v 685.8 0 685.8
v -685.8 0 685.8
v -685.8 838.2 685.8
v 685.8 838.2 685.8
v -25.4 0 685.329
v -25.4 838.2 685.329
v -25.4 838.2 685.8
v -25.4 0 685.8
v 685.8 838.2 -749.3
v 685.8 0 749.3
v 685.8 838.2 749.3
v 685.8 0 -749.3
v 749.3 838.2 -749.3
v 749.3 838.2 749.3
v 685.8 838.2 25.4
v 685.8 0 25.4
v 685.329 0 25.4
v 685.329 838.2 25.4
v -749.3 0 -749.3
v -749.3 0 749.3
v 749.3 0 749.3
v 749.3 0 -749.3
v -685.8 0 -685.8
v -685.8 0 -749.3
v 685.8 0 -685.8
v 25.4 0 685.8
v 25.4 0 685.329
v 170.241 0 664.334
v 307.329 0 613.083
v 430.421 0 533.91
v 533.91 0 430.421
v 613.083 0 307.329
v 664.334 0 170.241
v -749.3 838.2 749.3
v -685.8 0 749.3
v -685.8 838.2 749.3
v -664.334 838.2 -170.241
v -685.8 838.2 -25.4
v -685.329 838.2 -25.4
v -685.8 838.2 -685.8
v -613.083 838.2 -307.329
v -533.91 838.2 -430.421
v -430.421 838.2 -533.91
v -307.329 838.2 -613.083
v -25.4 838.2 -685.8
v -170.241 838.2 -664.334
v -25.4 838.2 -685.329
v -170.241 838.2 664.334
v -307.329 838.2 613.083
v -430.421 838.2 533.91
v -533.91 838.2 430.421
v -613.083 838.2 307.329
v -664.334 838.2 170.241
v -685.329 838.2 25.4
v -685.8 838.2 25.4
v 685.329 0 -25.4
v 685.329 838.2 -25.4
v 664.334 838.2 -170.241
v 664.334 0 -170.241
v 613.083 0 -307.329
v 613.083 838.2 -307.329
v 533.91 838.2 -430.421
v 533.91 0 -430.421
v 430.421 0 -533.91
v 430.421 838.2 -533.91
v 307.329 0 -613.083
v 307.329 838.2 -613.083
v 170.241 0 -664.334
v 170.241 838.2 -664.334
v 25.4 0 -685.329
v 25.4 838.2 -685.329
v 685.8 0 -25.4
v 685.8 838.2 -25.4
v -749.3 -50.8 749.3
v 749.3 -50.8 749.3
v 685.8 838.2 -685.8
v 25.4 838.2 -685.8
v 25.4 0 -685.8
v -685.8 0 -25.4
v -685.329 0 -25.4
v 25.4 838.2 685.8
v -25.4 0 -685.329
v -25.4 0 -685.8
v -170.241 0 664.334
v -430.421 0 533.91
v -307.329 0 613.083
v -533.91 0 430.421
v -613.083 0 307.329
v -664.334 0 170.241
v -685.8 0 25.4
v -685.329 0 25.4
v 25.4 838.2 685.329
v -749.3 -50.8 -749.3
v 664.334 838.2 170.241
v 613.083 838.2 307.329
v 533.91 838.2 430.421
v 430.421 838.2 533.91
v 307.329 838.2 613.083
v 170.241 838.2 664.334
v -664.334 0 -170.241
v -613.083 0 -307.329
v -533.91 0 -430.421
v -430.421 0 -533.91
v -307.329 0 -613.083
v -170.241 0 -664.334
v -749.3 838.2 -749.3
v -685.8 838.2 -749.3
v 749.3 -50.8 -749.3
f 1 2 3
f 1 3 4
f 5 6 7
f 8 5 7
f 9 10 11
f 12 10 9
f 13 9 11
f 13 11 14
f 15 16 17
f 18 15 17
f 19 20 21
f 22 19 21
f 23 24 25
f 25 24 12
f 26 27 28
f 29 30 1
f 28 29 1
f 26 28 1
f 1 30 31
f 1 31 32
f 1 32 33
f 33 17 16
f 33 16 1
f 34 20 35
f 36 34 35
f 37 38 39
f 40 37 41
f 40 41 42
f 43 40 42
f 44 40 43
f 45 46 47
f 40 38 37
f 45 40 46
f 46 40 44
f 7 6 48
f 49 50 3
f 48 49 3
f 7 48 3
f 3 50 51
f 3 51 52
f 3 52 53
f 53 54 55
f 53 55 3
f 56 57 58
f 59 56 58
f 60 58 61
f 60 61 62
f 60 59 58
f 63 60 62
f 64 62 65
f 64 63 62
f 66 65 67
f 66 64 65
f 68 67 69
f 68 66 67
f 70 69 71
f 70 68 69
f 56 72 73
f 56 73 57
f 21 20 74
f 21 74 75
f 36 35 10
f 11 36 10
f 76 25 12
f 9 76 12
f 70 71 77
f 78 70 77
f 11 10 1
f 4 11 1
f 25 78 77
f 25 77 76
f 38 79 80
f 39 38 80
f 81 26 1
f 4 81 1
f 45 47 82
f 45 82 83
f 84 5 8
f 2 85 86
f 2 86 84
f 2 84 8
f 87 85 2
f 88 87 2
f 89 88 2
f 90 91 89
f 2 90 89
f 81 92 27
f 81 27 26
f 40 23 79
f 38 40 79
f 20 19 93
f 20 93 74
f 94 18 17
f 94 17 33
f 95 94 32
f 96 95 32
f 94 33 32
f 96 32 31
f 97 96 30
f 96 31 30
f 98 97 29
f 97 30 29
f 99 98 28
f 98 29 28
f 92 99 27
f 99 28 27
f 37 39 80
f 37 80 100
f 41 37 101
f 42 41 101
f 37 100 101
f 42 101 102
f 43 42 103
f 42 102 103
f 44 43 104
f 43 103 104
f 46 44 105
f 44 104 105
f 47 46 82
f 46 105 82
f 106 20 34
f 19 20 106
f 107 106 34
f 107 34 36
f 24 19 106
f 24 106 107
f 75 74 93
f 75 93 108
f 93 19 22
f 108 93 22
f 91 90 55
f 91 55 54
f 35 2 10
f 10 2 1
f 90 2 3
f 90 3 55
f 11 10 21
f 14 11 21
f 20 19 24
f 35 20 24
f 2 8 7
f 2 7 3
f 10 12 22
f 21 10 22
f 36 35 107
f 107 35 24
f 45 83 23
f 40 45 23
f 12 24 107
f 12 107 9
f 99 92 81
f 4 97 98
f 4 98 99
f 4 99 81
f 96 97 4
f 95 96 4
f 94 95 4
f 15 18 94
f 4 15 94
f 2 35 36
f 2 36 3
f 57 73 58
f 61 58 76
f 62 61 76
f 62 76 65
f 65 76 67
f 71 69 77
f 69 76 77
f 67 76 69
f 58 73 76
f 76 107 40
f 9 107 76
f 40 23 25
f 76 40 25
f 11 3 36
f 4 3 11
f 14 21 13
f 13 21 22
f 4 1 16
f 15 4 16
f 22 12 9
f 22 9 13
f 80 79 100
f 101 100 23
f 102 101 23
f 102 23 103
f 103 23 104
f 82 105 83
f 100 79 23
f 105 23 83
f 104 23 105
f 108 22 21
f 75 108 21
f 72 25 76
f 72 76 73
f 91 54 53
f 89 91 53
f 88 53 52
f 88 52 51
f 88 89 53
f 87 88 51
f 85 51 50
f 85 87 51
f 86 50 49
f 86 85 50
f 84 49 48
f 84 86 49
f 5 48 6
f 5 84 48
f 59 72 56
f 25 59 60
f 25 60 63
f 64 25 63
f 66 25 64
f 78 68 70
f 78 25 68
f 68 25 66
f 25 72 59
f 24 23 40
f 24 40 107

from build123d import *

# Parameters (mm, degrees)
SKETCH1_W             = 1371.6
SKETCH1_H             = 63.5
BOSS_EXTRUDE1_DEPTH   = 838.2
BOSS_EXTRUDE1_2_DEPTH = 838.2
SKETCH2_W             = 63.5
SKETCH2_H             = 1498.6
BOSS_EXTRUDE2_DEPTH   = 838.2
BOSS_EXTRUDE2_2_DEPTH = 838.2
SKETCH3_W             = 1498.6
SKETCH3_H             = 1498.6
BOSS_EXTRUDE3_DEPTH   = 50.8
BOSS_EXTRUDE4_DEPTH   = 838.2
BOSS_EXTRUDE4_2_DEPTH = 838.2
BOSS_EXTRUDE4_3_DEPTH = 838.2
BOSS_EXTRUDE4_4_DEPTH = 838.2


with BuildPart() as part:
    # Sketch1 → Boss-Extrude1 (new body)
    with BuildSketch(Plane(origin=(0, 0, 0), x_dir=(1, 0, 0), z_dir=(0, 1, 0))):
        with Locations((0, 717.55)):
            Rectangle(SKETCH1_W, SKETCH1_H)
    extrude(amount=BOSS_EXTRUDE1_DEPTH)


with BuildPart() as body_2:
    # Sketch1 → Boss-Extrude1 2 (new body)
    with BuildSketch(Plane(origin=(0, 0, 0), x_dir=(1, 0, 0), z_dir=(0, 1, 0))):
        with Locations((0, -717.55)):
            Rectangle(SKETCH1_W, SKETCH1_H)
    extrude(amount=BOSS_EXTRUDE1_2_DEPTH)


with BuildPart() as body_3:
    # Sketch2 → Boss-Extrude2 (new body)
    with BuildSketch(Plane(origin=(0, 0, 0), x_dir=(1, 0, 0), z_dir=(0, 1, 0))):
        with Locations((717.55, 0)):
            Rectangle(SKETCH2_W, SKETCH2_H)
    extrude(amount=BOSS_EXTRUDE2_DEPTH)


with BuildPart() as body_4:
    # Sketch2 → Boss-Extrude2 2 (new body)
    with BuildSketch(Plane(origin=(0, 0, 0), x_dir=(1, 0, 0), z_dir=(0, 1, 0))):
        with Locations((-717.55, 0)):
            Rectangle(SKETCH2_W, SKETCH2_H)
    extrude(amount=BOSS_EXTRUDE2_2_DEPTH)


with BuildPart() as body_5:
    # Sketch3 → Boss-Extrude3 (new body)
    with BuildSketch(Plane.XZ):
        Rectangle(SKETCH3_W, SKETCH3_H)
    extrude(amount=BOSS_EXTRUDE3_DEPTH)


with BuildPart() as body_6:
    # Sketch4 → Boss-Extrude4 (new body)
    with BuildSketch(Plane(origin=(0, 0, 0), x_dir=(1, 0, 0), z_dir=(0, 1, 0))):
        with BuildLine():
            Line((685.8, -685.8), (685.8, -25.4))
            Line((685.8, -25.4), (685.329468212, -25.4))
            ThreePointArc((685.329468212, -25.4), (484.933830538, -484.933830538), (25.4, -685.329468212))
            Line((25.4, -685.329468212), (25.4, -685.8))
            Line((25.4, -685.8), (685.8, -685.8))
        make_face()
    extrude(amount=BOSS_EXTRUDE4_DEPTH)


with BuildPart() as body_7:
    # Sketch4 → Boss-Extrude4 2 (new body)
    with BuildSketch(Plane(origin=(0, 0, 0), x_dir=(1, 0, 0), z_dir=(0, 1, 0))):
        with BuildLine():
            Line((-685.8, 685.8), (-685.8, 25.4))
            Line((-685.8, 25.4), (-685.329468212, 25.4))
            ThreePointArc((-685.329468212, 25.4), (-484.933830538, 484.933830538), (-25.4, 685.329468212))
            Line((-25.4, 685.329468212), (-25.4, 685.8))
            Line((-25.4, 685.8), (-685.8, 685.8))
        make_face()
    extrude(amount=BOSS_EXTRUDE4_2_DEPTH)


with BuildPart() as body_8:
    # Sketch4 → Boss-Extrude4 3 (new body)
    with BuildSketch(Plane(origin=(0, 0, 0), x_dir=(1, 0, 0), z_dir=(0, 1, 0))):
        with BuildLine():
            Line((25.4, 685.8), (685.8, 685.8))
            Line((685.8, 685.8), (685.8, 25.4))
            Line((685.8, 25.4), (685.329468212, 25.4))
            ThreePointArc((685.329468212, 25.4), (484.933830538, 484.933830538), (25.4, 685.329468212))
            Line((25.4, 685.329468212), (25.4, 685.8))
        make_face()
    extrude(amount=BOSS_EXTRUDE4_3_DEPTH)


with BuildPart() as body_9:
    # Sketch4 → Boss-Extrude4 4 (new body)
    with BuildSketch(Plane(origin=(0, 0, 0), x_dir=(1, 0, 0), z_dir=(0, 1, 0))):
        with BuildLine():
            Line((-25.4, -685.8), (-685.8, -685.8))
            Line((-685.8, -685.8), (-685.8, -25.4))
            Line((-685.8, -25.4), (-685.329468212, -25.4))
            ThreePointArc((-685.329468212, -25.4), (-484.933830538, -484.933830538), (-25.4, -685.329468212))
            Line((-25.4, -685.329468212), (-25.4, -685.8))
        make_face()
    extrude(amount=BOSS_EXTRUDE4_4_DEPTH)


solid = Compound([part.part, body_2.part, body_3.part, body_4.part, body_5.part, body_6.part, body_7.part, body_8.part, body_9.part])
